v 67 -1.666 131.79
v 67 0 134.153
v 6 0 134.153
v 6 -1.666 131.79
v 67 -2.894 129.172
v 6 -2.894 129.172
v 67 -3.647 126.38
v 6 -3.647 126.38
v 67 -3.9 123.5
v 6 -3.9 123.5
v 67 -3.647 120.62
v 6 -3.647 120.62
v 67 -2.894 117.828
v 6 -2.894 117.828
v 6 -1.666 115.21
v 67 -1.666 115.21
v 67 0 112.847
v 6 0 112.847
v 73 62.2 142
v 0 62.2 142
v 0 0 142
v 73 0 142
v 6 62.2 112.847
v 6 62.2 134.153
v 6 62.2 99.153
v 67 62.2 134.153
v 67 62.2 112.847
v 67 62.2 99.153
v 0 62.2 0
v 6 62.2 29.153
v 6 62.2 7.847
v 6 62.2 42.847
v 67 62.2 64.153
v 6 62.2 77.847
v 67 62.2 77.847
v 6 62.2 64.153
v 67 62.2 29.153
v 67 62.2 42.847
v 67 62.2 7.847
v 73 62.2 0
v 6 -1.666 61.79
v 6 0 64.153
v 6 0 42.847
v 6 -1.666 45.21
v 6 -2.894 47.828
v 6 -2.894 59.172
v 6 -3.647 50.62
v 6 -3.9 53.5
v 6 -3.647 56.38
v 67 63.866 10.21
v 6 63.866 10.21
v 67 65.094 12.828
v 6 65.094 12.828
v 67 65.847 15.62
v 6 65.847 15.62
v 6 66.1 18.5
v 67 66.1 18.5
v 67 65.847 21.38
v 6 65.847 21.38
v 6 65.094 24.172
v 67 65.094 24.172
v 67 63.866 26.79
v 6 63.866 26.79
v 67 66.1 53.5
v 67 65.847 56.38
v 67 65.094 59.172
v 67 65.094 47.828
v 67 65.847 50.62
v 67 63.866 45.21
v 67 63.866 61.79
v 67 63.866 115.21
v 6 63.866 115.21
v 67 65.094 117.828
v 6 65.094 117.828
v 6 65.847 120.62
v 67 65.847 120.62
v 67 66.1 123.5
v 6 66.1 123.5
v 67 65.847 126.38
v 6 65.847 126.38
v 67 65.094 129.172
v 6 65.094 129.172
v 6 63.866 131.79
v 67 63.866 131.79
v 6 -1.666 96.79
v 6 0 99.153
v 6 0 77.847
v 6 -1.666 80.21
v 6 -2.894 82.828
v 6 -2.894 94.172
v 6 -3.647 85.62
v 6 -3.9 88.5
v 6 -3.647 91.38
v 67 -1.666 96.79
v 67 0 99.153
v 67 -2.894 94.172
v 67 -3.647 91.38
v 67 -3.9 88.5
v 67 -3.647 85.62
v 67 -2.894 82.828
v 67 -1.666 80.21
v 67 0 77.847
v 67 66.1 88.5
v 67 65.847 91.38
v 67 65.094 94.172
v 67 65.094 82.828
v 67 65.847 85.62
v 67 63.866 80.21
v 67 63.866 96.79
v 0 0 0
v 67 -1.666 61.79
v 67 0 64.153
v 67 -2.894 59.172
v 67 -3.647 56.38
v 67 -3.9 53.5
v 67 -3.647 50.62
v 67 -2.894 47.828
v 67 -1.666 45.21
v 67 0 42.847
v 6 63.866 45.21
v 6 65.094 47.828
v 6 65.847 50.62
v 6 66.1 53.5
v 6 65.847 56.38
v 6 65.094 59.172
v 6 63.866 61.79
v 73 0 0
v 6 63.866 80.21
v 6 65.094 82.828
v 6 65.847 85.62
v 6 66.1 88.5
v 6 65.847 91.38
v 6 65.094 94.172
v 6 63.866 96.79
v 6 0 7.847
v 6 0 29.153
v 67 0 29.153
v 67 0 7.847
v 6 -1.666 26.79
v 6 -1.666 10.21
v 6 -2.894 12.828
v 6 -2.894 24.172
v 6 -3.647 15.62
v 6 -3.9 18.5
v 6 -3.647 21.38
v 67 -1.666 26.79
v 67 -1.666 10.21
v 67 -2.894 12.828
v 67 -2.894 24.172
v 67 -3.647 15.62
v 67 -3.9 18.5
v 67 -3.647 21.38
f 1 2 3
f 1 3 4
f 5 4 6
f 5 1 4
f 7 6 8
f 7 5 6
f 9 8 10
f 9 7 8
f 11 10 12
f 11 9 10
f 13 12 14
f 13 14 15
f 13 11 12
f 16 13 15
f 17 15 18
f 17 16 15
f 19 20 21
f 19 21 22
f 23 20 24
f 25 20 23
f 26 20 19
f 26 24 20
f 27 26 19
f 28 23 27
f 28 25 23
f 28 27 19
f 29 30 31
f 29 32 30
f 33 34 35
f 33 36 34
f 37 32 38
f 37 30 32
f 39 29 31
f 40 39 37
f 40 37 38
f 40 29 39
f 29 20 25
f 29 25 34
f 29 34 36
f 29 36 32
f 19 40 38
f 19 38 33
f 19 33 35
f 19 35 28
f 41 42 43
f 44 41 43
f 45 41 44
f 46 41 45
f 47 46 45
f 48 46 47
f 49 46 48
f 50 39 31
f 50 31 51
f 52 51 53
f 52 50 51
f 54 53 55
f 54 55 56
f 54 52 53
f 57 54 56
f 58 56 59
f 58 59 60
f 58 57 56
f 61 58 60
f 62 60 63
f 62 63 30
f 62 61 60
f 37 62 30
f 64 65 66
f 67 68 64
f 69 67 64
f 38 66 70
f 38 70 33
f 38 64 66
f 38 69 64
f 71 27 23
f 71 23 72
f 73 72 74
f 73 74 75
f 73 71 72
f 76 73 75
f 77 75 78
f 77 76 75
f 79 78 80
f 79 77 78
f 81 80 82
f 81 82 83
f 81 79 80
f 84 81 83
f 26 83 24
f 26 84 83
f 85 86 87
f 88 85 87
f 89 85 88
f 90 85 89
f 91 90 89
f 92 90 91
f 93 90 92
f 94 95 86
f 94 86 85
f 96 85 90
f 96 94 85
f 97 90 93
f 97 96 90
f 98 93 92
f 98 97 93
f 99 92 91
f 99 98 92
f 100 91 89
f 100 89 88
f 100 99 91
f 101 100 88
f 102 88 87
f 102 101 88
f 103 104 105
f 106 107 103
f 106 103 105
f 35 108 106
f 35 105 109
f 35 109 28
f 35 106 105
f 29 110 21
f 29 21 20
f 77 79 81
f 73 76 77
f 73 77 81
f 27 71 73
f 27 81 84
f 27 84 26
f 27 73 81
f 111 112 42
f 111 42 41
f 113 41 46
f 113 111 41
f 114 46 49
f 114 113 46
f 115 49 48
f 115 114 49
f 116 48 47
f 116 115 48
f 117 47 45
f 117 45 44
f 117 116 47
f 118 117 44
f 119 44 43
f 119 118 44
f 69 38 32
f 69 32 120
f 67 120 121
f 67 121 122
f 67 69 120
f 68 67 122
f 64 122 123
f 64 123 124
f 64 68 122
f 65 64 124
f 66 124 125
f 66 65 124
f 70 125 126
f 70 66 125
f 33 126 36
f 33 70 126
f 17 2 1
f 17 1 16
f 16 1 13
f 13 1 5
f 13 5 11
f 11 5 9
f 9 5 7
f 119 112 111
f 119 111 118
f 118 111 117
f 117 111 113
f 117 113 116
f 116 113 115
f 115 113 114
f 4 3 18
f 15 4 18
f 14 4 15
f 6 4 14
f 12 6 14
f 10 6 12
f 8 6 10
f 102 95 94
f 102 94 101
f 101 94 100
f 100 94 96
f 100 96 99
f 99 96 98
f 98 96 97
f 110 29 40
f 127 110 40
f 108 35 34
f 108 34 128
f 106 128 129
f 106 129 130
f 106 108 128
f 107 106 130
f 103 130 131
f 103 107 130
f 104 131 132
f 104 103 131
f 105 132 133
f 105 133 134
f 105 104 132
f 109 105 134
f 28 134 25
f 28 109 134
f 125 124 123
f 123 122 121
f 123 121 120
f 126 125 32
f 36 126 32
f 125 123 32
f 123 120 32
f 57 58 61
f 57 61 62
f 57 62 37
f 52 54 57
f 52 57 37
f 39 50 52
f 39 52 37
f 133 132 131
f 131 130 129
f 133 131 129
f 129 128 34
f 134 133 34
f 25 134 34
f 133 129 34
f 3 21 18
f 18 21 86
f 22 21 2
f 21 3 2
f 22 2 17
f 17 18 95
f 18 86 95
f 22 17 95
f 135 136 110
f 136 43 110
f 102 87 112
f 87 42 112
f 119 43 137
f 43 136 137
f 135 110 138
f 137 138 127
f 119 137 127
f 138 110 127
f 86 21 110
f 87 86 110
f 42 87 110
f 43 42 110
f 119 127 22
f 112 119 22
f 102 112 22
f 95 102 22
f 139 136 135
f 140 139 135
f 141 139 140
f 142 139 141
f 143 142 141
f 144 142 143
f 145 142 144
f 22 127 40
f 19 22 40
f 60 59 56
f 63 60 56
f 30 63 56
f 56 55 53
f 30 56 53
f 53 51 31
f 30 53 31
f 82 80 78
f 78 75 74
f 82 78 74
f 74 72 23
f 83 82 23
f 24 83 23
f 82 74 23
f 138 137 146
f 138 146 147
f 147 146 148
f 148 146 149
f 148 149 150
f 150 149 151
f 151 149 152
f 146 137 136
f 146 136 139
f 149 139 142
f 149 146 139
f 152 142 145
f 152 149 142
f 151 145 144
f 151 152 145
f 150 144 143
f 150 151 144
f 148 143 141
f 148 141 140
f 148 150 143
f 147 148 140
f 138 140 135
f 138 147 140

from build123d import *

# Parameters (mm, degrees)
ESQUISSE1_W        = 73
ESQUISSE1_H        = 62.2
BOSS_EXTRU_1_DEPTH = 142
BOSS_EXTRU_2_START = -6
ESQUISSE2_R        = 16.5
BOSS_EXTRU_2_DEPTH = 61


with BuildPart() as part:
    # Esquisse1 → Boss.-Extru.1 (new body)
    with BuildSketch(Plane.XY):
        with Locations((36.5, 31.1)):
            Rectangle(ESQUISSE1_W, ESQUISSE1_H)
    extrude(amount=BOSS_EXTRU_1_DEPTH)

    # Esquisse2 → Boss.-Extru.2 (add)
    with BuildSketch(Plane(origin=(73, 0, 0), x_dir=(0, 0, -1), z_dir=(1, 0, 0)).offset(BOSS_EXTRU_2_START)):
        with Locations((-123.5, 49.6)):
            Circle(ESQUISSE2_R)
        with Locations((-88.5, 49.6)):
            Circle(ESQUISSE2_R)
        with Locations((-53.5, 49.6)):
            Circle(ESQUISSE2_R)
        with Locations((-18.5, 49.6)):
            Circle(ESQUISSE2_R)
        with Locations((-123.5, 12.6)):
            Circle(ESQUISSE2_R)
        with Locations((-88.5, 12.6)):
            Circle(ESQUISSE2_R)
        with Locations((-53.5, 12.6)):
            Circle(ESQUISSE2_R)
        with Locations((-18.5, 12.6)):
            Circle(ESQUISSE2_R)
    extrude(amount=-BOSS_EXTRU_2_DEPTH)


solid = part.part
